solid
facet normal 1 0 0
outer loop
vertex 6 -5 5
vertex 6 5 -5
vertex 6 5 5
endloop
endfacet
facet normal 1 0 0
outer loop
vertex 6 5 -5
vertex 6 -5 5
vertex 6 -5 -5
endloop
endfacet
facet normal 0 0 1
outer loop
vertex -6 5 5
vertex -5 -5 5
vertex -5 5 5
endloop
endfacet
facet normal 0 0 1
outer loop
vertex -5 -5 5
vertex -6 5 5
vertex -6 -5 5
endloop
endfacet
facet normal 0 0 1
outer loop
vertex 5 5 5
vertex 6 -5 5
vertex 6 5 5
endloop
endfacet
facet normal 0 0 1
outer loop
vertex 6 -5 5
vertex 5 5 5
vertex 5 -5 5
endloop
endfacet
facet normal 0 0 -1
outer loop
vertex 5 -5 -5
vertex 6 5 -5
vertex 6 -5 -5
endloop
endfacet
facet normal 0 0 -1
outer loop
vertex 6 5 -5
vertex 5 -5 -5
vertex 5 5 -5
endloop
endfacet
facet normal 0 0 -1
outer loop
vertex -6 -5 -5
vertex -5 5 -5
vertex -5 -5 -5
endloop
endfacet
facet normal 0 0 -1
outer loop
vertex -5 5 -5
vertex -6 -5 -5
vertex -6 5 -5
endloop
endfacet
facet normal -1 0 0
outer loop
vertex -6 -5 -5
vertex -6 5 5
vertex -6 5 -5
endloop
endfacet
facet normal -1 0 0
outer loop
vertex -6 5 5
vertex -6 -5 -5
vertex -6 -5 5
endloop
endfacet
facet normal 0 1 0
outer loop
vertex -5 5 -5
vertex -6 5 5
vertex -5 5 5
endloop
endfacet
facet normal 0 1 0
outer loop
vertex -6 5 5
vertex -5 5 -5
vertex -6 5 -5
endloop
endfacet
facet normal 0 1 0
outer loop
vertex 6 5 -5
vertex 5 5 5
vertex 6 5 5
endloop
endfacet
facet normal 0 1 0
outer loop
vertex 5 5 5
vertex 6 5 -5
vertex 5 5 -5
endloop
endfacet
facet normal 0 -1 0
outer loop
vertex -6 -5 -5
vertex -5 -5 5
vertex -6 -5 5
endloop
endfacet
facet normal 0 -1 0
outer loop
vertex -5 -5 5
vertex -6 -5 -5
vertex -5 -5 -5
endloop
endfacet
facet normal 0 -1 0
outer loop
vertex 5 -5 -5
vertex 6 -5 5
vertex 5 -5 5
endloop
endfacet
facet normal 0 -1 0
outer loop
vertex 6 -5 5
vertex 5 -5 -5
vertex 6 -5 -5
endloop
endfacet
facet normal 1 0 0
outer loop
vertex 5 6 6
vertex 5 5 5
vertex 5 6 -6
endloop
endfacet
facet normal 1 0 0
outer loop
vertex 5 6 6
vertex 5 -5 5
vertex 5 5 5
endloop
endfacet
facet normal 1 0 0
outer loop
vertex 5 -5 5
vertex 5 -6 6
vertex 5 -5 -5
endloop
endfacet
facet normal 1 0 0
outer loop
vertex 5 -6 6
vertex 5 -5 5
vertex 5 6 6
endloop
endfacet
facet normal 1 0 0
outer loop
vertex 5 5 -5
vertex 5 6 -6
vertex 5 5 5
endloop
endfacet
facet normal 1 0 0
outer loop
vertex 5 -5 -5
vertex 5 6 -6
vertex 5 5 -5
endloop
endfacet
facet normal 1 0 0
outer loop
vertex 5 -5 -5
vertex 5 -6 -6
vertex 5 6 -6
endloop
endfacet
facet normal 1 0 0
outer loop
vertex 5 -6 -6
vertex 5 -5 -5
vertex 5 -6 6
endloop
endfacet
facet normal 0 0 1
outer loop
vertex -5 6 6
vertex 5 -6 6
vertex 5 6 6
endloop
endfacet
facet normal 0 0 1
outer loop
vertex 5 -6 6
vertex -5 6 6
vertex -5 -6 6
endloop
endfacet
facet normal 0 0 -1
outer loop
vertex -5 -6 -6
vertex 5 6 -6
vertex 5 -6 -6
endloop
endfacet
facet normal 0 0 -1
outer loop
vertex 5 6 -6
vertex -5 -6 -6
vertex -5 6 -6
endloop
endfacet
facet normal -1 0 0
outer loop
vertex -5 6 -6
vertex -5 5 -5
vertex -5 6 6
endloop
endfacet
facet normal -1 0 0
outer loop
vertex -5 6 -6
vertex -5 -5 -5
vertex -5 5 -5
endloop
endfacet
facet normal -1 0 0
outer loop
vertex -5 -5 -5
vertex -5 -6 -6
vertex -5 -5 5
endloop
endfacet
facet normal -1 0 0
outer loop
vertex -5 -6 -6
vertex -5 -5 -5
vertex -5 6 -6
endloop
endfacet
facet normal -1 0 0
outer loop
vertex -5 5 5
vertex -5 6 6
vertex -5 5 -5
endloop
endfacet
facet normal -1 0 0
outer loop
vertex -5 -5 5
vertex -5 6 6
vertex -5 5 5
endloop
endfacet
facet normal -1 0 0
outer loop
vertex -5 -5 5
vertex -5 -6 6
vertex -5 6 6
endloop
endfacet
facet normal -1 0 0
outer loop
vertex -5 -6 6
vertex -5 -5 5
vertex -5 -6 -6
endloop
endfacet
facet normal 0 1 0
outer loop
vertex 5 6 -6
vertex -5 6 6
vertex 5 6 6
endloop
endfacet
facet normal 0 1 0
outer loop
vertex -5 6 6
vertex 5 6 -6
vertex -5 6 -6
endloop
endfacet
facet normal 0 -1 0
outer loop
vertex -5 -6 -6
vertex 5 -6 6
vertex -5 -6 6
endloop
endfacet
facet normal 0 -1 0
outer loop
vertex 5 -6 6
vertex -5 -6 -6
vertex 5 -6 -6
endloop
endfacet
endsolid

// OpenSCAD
// Unit of length: Unit.MM
union()
{
   color(c = [1.0, 0.0, 0.0, 1.0])
   {
      cube(size = [12.0, 10.0, 10.0], center = true);
   }
   cube(size = [10.0, 12.0, 12.0], center = true);
}
